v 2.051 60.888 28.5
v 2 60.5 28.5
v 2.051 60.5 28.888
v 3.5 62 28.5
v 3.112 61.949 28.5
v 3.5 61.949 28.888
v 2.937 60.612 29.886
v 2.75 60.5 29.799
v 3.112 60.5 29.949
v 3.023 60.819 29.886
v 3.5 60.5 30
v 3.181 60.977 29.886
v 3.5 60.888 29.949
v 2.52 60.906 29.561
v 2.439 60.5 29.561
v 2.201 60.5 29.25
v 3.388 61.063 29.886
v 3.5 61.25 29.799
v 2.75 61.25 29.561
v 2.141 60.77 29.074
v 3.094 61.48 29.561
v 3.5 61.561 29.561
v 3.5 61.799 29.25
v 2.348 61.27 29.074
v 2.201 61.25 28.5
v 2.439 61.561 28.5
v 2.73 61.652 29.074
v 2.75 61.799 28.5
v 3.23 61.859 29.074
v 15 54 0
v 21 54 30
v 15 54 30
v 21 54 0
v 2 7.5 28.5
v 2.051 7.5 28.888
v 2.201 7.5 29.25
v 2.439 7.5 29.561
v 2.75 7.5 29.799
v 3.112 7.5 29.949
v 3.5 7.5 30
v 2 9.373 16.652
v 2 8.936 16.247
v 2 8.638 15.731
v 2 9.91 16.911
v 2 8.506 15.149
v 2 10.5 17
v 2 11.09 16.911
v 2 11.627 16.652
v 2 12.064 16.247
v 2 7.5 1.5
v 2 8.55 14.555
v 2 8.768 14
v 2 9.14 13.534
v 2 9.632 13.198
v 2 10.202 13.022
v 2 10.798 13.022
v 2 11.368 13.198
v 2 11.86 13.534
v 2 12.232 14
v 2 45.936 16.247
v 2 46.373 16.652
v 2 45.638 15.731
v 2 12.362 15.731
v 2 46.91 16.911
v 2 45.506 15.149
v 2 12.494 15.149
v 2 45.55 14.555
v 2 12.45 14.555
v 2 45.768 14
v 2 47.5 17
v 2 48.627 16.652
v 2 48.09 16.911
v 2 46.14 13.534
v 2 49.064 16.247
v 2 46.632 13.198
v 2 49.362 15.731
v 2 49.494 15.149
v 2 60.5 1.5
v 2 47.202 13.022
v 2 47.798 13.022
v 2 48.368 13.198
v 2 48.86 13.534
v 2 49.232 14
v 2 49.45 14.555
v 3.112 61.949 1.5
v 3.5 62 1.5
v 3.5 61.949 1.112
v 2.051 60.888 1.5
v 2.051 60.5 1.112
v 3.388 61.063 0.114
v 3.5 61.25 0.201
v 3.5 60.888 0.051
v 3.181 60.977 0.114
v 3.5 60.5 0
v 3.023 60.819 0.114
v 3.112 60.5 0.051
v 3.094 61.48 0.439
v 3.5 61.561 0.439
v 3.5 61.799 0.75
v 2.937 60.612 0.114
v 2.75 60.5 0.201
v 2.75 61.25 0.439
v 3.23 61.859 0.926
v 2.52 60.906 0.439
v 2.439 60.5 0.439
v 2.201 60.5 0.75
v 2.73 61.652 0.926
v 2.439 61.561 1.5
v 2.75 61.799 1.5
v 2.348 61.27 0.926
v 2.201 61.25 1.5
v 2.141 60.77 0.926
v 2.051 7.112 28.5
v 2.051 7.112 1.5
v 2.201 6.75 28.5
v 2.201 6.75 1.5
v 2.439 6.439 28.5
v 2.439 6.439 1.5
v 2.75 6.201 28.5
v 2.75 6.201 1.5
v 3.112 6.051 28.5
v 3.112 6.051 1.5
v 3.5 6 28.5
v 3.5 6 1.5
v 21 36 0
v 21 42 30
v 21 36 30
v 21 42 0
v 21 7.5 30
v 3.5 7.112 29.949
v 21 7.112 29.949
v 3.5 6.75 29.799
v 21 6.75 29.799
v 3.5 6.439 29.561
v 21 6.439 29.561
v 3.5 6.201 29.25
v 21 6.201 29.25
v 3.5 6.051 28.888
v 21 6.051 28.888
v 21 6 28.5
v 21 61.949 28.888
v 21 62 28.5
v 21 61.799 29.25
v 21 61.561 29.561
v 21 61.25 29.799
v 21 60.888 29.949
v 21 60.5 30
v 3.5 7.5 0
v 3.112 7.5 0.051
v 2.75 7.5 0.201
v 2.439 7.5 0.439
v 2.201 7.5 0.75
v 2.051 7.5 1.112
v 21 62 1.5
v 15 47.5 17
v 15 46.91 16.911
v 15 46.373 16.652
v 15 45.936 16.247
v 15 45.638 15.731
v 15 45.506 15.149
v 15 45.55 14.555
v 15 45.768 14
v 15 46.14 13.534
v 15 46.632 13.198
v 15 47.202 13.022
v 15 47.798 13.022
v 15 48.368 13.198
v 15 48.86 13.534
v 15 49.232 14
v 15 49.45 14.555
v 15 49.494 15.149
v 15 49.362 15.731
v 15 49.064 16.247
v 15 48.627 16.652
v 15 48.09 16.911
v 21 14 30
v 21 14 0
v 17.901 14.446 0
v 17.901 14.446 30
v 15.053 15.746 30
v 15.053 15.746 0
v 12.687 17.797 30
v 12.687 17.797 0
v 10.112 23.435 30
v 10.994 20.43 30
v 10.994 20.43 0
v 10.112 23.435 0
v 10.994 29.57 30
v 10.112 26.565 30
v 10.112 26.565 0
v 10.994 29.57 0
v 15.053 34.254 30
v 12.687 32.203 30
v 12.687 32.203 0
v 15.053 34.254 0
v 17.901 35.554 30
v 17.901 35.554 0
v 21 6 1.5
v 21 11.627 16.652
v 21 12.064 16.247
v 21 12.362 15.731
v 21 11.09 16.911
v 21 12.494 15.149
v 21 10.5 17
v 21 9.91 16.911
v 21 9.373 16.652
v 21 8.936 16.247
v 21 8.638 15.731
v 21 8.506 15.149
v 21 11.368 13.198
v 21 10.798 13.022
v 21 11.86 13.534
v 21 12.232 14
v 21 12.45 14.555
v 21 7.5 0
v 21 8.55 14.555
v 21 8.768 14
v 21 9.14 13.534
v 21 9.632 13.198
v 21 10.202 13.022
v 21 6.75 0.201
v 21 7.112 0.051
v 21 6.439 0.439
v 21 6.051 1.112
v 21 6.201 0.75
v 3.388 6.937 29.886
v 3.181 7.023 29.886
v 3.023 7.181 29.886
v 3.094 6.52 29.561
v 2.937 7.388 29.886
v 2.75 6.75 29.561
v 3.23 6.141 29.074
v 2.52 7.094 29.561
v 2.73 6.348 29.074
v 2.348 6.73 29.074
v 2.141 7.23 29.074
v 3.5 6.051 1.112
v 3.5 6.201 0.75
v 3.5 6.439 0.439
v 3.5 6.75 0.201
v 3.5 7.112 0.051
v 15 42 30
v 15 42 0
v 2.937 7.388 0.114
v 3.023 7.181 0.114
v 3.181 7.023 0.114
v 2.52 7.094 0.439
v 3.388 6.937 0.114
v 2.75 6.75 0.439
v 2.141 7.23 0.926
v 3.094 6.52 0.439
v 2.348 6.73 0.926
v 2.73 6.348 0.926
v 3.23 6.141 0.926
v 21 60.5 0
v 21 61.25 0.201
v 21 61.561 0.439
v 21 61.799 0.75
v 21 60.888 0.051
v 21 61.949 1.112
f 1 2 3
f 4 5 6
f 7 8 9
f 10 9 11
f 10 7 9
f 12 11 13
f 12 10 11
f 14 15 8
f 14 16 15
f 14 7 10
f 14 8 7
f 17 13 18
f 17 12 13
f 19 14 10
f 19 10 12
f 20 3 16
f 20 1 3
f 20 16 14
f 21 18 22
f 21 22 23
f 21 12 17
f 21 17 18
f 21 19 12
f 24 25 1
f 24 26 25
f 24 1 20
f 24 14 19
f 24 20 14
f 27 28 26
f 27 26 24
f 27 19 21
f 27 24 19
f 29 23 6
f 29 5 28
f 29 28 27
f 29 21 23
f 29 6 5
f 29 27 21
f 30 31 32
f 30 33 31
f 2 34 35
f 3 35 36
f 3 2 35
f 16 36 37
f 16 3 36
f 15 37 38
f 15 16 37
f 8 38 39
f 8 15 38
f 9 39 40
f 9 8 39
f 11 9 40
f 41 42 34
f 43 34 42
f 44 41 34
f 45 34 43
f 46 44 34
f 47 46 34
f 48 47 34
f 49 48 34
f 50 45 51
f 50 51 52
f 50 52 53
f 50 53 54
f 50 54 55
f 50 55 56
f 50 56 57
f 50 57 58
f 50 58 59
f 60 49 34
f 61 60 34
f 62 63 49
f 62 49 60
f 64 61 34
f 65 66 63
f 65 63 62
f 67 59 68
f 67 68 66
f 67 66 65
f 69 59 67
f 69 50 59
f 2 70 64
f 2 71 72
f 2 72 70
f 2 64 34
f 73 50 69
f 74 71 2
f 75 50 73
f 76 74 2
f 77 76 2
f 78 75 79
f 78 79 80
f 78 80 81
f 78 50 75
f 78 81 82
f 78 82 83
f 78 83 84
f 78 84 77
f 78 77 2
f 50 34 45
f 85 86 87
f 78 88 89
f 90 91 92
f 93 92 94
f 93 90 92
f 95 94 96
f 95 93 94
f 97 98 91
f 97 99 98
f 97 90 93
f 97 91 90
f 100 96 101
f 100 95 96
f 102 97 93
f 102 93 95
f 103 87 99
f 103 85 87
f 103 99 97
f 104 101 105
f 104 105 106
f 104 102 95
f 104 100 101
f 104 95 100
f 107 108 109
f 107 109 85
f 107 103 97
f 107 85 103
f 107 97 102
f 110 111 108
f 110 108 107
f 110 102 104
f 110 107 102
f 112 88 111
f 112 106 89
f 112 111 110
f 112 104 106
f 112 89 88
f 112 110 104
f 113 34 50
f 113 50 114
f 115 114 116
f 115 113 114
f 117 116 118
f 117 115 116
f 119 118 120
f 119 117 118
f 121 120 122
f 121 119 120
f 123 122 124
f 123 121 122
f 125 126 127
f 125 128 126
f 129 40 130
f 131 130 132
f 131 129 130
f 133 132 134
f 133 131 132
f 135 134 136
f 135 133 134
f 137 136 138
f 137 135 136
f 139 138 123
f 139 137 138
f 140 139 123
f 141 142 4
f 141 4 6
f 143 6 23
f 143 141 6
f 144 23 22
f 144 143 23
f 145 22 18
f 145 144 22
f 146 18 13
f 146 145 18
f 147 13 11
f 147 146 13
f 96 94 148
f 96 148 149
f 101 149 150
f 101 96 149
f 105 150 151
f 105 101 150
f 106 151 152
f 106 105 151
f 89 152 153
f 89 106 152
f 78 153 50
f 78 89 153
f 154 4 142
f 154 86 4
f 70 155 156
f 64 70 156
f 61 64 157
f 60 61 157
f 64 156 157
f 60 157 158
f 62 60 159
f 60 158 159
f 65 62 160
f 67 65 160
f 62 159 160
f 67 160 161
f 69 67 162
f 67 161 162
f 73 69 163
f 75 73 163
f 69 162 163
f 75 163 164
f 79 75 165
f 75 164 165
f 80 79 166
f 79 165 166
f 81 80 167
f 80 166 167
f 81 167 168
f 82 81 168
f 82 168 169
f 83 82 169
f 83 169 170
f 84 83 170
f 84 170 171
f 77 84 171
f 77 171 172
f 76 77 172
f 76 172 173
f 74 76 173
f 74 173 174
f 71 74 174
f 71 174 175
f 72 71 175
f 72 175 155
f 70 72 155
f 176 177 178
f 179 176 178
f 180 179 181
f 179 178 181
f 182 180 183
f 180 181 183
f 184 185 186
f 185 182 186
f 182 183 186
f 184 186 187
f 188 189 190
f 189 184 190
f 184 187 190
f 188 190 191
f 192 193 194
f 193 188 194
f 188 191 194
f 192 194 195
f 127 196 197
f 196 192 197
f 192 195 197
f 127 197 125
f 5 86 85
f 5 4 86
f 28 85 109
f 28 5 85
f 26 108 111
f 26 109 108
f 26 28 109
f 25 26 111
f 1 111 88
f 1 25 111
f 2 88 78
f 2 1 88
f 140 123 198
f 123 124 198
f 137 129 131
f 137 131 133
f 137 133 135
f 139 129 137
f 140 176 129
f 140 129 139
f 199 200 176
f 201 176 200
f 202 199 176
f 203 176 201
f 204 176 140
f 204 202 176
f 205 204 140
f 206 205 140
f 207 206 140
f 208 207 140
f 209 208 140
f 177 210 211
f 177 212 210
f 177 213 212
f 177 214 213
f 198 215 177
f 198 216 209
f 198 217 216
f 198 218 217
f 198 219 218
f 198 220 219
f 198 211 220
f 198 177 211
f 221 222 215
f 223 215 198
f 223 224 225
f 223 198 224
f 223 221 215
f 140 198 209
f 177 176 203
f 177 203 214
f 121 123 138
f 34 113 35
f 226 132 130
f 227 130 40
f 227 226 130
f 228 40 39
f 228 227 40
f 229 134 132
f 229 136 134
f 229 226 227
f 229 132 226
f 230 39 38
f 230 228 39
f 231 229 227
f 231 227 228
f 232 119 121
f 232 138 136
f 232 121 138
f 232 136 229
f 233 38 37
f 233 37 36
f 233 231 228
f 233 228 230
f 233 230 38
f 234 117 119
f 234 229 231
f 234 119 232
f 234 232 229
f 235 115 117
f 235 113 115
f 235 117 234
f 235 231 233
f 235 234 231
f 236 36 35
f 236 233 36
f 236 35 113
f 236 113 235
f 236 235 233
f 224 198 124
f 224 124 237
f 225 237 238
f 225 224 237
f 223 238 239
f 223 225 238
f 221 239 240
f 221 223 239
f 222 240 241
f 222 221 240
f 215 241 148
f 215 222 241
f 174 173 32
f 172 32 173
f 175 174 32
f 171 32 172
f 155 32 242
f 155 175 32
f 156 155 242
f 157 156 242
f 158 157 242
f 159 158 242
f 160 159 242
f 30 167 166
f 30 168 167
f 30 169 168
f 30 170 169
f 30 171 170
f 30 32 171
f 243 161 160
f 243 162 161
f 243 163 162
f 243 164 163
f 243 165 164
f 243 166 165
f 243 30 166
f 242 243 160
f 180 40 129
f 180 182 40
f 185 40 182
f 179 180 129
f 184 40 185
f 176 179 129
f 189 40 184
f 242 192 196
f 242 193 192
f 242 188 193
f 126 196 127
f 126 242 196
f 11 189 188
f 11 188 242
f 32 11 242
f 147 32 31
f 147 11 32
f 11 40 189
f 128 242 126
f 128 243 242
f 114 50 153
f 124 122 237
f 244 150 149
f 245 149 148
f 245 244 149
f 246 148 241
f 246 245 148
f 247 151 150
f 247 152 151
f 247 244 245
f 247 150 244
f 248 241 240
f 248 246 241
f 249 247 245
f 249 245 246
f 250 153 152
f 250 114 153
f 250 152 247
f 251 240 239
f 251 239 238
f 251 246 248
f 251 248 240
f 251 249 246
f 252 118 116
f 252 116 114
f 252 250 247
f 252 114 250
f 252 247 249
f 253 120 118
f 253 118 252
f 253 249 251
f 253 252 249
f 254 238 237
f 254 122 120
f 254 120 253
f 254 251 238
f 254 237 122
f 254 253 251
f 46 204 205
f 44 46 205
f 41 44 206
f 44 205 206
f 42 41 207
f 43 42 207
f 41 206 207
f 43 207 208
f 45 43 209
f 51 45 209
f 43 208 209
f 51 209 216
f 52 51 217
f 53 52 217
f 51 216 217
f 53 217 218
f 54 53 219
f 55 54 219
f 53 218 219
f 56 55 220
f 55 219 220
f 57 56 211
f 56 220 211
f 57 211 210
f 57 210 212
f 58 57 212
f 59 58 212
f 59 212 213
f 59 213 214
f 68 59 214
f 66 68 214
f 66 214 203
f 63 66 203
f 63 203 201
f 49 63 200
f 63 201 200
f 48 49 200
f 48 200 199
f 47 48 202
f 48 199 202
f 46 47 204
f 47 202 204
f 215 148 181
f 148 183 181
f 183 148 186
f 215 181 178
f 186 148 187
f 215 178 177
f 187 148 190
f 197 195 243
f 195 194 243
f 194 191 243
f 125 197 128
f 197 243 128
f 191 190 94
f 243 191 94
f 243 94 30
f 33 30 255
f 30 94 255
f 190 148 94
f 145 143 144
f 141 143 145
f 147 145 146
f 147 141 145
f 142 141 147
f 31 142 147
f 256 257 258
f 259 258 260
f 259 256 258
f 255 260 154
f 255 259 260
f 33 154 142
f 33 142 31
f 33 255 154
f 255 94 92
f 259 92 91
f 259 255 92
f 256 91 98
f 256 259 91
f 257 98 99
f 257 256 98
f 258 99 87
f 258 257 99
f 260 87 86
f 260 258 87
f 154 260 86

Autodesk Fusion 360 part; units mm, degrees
sketch "Esboço1" plane through (0, 0, 0) normal (0, 0, 1) x (1, 0, 0)
  line L0 (1.9999, 62) -> (2, 62)
  line L1 (15, 42) -> (21, 42)
  line L2 (15, 54) -> (15, 42)
  line L3 (2, 6) -> (2, 62)
  line L4 (1.9999, 62) -> (21, 62)
  line L5 (2, 6) -> (21, 6)
  line L6 (21, 62) -> (21, 54)
  line L7 (21, 54) -> (15, 54)
  line L8 (21, 14) -> (21, 6)
  line L9 (21, 42) -> (21, 36)
  arc A0 (21, 36) -> (21, 14) centre (21, 25) ccw
  dimension "d2" = 12
  dimension "d3" = 6
  dimension "d5" = 8
  dimension "d8" = 6
  dimension "d10" = 8
  dimension "d36" = 19
  dimension "d12" = 6
  dimension "d13" = 11
extrude "Extrusão1" add sketch "Esboço1" along normal blind 30
hole "Furo1" at (2, 48, 15) direction (1, 0, 0) diameter 4 depth 21 tip angle 180
hole "Furo2" at (2, 10, 15) direction (1, 0, 0) diameter 4 depth 21 tip angle 180
fillet "Arredondamento1" radius 1.5 8 edges at (11.5, 62, 30) (2, 62, 15) (2, 34, 30) (2, 6, 15) (11.5, 6, 30) (11.5, 6, 0) (2, 34, 0) (11.5, 62, 0)
